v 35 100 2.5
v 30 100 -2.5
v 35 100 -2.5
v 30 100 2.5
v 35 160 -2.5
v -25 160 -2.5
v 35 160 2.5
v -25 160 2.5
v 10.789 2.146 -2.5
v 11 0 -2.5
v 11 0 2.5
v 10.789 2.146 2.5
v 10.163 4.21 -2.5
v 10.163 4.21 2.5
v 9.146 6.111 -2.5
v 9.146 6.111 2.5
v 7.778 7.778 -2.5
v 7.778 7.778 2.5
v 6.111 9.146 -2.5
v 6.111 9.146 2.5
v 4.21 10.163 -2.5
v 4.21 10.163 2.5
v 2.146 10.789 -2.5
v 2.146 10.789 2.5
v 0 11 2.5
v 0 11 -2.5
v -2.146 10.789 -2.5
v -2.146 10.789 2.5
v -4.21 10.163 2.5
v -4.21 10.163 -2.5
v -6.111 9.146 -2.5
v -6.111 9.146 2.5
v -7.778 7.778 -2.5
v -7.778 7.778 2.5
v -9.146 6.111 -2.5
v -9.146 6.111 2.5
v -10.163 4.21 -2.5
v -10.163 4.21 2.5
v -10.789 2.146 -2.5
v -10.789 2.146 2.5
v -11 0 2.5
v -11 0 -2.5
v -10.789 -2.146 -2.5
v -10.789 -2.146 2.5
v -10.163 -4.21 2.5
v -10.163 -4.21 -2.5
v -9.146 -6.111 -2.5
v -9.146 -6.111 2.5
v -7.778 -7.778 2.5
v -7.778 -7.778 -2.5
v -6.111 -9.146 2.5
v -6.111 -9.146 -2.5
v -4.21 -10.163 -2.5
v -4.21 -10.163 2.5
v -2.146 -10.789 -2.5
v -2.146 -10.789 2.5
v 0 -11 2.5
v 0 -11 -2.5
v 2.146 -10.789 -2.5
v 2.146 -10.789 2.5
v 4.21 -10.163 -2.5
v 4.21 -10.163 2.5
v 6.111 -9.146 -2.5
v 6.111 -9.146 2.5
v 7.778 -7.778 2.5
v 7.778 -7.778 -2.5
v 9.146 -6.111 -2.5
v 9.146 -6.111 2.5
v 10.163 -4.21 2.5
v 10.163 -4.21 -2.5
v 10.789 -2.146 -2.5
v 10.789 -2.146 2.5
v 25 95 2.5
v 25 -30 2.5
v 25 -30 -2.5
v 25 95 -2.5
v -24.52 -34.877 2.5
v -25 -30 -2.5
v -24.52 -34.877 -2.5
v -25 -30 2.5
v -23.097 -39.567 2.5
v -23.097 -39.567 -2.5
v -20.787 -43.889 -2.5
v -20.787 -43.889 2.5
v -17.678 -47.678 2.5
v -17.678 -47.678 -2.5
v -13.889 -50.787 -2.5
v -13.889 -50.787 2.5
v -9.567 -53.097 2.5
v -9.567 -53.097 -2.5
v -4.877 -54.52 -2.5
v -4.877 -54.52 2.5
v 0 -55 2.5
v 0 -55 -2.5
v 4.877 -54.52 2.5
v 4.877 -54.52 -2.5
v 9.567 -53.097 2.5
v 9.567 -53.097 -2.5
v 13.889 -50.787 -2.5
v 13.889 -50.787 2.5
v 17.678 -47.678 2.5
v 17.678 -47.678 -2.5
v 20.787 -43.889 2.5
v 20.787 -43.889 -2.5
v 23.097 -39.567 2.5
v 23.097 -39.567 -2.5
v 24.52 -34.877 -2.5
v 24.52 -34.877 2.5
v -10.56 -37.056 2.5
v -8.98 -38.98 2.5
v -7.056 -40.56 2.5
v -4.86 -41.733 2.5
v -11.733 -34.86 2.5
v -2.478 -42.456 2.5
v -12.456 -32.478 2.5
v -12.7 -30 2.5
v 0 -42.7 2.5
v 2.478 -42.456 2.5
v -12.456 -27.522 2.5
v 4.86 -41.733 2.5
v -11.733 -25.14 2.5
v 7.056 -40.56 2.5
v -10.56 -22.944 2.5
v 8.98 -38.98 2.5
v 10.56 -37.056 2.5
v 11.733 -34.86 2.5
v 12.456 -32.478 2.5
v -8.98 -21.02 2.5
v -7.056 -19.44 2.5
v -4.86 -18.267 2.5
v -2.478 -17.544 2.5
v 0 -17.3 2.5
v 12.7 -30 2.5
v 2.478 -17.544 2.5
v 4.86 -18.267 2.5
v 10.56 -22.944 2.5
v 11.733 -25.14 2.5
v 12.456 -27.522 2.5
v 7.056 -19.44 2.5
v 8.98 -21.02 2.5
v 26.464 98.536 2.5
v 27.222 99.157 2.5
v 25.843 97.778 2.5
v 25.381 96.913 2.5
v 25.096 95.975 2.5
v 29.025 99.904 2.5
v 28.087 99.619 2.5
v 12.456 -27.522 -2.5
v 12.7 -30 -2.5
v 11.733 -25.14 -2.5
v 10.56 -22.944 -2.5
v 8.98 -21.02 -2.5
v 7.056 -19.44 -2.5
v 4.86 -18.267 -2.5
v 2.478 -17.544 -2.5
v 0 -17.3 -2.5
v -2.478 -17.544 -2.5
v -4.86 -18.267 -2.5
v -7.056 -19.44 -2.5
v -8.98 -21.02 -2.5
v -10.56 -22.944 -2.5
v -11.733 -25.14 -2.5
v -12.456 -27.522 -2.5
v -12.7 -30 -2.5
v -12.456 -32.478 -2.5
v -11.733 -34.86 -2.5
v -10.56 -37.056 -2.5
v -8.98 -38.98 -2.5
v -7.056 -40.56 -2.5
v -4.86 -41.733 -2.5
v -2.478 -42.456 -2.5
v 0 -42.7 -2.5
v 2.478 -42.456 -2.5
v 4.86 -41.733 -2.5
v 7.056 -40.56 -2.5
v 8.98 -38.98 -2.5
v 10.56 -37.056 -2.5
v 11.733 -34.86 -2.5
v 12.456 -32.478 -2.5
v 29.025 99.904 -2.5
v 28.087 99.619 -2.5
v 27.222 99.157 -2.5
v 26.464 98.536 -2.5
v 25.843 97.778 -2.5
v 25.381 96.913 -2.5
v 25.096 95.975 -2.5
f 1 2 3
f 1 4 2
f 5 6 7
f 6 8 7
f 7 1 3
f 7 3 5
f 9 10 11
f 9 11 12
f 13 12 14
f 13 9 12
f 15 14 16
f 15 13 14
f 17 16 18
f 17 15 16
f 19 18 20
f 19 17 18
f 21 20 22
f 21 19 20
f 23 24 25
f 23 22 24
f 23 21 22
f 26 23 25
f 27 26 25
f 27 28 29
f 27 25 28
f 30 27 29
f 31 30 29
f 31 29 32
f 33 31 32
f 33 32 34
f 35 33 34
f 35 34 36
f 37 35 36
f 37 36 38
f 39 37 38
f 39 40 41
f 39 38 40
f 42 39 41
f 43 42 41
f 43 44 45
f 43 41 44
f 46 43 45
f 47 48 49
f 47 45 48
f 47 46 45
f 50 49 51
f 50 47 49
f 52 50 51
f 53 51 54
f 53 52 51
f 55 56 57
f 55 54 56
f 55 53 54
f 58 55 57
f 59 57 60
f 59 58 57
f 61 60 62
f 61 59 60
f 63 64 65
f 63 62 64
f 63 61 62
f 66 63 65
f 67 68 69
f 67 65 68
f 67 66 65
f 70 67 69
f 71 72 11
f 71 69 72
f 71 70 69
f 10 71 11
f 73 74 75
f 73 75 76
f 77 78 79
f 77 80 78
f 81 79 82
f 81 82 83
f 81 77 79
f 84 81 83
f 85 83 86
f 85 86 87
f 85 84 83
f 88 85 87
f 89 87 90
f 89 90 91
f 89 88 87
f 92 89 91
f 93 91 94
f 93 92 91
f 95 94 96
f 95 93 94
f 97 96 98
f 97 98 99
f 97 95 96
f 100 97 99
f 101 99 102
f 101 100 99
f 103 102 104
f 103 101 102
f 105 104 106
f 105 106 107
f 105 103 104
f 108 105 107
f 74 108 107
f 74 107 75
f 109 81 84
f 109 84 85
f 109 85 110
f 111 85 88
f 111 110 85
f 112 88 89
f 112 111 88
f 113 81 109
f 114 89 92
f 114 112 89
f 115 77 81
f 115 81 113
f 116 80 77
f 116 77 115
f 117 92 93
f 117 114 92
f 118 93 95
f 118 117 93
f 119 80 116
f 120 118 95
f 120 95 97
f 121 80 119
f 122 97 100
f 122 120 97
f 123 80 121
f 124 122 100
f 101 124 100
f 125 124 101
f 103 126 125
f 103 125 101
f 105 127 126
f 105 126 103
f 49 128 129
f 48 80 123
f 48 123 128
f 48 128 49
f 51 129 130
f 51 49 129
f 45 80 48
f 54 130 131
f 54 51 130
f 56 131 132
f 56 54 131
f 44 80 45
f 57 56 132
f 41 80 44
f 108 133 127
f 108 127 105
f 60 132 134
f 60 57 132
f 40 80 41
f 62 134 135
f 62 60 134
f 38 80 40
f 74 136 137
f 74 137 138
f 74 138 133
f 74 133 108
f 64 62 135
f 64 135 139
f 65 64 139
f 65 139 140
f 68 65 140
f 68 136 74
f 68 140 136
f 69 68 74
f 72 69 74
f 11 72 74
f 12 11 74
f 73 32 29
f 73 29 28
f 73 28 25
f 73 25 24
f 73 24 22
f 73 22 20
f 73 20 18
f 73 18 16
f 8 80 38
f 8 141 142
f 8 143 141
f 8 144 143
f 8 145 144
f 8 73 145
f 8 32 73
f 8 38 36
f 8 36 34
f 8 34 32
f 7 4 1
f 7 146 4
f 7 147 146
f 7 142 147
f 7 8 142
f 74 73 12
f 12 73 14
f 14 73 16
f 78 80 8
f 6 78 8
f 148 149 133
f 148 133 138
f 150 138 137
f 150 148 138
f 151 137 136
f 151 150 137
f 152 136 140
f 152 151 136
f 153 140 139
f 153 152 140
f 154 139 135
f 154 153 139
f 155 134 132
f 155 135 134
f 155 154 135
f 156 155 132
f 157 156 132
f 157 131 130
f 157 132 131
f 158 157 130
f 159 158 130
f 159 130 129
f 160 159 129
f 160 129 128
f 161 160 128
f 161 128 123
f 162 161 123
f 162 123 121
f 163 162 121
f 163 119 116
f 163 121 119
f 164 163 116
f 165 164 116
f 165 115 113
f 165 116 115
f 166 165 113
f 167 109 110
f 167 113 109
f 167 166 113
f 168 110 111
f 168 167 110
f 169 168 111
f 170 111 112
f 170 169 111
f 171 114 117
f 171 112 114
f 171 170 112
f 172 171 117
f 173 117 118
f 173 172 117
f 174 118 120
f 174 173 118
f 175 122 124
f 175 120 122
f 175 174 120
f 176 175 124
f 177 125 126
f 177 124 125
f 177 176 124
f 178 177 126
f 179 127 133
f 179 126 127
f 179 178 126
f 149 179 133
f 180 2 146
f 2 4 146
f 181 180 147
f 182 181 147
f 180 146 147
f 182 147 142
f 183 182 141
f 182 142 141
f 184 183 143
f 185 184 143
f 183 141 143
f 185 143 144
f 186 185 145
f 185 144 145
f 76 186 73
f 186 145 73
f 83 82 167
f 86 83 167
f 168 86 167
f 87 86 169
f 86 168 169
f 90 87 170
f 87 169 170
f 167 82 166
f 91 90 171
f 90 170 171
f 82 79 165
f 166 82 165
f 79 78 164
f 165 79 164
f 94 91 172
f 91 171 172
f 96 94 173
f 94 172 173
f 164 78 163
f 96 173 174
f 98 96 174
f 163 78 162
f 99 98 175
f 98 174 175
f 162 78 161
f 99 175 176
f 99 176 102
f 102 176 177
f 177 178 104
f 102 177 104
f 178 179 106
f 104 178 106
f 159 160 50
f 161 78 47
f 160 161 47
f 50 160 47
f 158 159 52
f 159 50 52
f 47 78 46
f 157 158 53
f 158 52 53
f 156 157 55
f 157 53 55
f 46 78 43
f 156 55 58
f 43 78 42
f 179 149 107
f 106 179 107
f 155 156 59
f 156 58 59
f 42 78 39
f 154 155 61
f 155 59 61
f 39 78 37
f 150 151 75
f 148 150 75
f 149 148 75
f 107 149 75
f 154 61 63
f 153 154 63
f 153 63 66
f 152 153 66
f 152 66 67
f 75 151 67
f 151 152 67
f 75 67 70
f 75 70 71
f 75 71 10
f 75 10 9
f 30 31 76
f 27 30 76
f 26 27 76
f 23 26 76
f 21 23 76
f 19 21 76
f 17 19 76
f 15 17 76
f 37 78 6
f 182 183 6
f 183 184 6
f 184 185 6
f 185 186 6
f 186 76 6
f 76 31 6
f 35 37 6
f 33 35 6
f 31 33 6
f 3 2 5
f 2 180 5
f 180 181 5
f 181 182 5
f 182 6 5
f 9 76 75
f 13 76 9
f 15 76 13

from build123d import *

# Parameters (mm, degrees)
SKETCH1_R               = 25
BOSS_EXTRUDE1_DEPTH     = 2.5
SKETCH3_W               = 50
SKETCH3_H               = 190
BOSS_EXTRUDE2_DEPTH     = 2.5
SKETCH4_W               = 10
SKETCH4_H               = 60
BOSS_EXTRUDE3_DEPTH     = 2.5
CUT_EXTRUDE2_DEPTH      = 164.802472509
CUT_EXTRUDE2_DEPTH_BACK = 164.802472509
SKETCH7_R               = 11
SKETCH7_R_2             = 12.7
FILLET1_R               = 5


with BuildPart() as part:
    # Sketch1 → Boss-Extrude1 (new, symmetric)
    with BuildSketch(Plane.XY):
        with Locations((0, -30)):
            Circle(SKETCH1_R)
    extrude(amount=BOSS_EXTRUDE1_DEPTH, both=True)

    # Sketch3 → Boss-Extrude2 (add, symmetric)
    with BuildSketch(Plane.XY):
        with Locations((0, 65)):
            Rectangle(SKETCH3_W, SKETCH3_H)
    extrude(amount=BOSS_EXTRUDE2_DEPTH, both=True)

    # Sketch4 → Boss-Extrude3 (add, symmetric)
    with BuildSketch(Plane.XY):
        with Locations((30, 130)):
            Rectangle(SKETCH4_W, SKETCH4_H)
    extrude(amount=BOSS_EXTRUDE3_DEPTH, both=True)

    # Sketch7 → Cut-Extrude2 (cut, two sides: drawn at the far end of the back side and taken through both)
    with BuildSketch(Plane.XY.offset(-CUT_EXTRUDE2_DEPTH_BACK)):
        Circle(SKETCH7_R)
        with Locations((0, -30)):
            Circle(SKETCH7_R_2)
    extrude(amount=CUT_EXTRUDE2_DEPTH + CUT_EXTRUDE2_DEPTH_BACK, mode=Mode.SUBTRACT)

    # Fillet1
    fillet1_edges = [part.edges().sort_by_distance(p)[0] for p in [
        (25, 100, 0),
    ]]
    fillet(fillet1_edges, radius=FILLET1_R)


solid = part.part
